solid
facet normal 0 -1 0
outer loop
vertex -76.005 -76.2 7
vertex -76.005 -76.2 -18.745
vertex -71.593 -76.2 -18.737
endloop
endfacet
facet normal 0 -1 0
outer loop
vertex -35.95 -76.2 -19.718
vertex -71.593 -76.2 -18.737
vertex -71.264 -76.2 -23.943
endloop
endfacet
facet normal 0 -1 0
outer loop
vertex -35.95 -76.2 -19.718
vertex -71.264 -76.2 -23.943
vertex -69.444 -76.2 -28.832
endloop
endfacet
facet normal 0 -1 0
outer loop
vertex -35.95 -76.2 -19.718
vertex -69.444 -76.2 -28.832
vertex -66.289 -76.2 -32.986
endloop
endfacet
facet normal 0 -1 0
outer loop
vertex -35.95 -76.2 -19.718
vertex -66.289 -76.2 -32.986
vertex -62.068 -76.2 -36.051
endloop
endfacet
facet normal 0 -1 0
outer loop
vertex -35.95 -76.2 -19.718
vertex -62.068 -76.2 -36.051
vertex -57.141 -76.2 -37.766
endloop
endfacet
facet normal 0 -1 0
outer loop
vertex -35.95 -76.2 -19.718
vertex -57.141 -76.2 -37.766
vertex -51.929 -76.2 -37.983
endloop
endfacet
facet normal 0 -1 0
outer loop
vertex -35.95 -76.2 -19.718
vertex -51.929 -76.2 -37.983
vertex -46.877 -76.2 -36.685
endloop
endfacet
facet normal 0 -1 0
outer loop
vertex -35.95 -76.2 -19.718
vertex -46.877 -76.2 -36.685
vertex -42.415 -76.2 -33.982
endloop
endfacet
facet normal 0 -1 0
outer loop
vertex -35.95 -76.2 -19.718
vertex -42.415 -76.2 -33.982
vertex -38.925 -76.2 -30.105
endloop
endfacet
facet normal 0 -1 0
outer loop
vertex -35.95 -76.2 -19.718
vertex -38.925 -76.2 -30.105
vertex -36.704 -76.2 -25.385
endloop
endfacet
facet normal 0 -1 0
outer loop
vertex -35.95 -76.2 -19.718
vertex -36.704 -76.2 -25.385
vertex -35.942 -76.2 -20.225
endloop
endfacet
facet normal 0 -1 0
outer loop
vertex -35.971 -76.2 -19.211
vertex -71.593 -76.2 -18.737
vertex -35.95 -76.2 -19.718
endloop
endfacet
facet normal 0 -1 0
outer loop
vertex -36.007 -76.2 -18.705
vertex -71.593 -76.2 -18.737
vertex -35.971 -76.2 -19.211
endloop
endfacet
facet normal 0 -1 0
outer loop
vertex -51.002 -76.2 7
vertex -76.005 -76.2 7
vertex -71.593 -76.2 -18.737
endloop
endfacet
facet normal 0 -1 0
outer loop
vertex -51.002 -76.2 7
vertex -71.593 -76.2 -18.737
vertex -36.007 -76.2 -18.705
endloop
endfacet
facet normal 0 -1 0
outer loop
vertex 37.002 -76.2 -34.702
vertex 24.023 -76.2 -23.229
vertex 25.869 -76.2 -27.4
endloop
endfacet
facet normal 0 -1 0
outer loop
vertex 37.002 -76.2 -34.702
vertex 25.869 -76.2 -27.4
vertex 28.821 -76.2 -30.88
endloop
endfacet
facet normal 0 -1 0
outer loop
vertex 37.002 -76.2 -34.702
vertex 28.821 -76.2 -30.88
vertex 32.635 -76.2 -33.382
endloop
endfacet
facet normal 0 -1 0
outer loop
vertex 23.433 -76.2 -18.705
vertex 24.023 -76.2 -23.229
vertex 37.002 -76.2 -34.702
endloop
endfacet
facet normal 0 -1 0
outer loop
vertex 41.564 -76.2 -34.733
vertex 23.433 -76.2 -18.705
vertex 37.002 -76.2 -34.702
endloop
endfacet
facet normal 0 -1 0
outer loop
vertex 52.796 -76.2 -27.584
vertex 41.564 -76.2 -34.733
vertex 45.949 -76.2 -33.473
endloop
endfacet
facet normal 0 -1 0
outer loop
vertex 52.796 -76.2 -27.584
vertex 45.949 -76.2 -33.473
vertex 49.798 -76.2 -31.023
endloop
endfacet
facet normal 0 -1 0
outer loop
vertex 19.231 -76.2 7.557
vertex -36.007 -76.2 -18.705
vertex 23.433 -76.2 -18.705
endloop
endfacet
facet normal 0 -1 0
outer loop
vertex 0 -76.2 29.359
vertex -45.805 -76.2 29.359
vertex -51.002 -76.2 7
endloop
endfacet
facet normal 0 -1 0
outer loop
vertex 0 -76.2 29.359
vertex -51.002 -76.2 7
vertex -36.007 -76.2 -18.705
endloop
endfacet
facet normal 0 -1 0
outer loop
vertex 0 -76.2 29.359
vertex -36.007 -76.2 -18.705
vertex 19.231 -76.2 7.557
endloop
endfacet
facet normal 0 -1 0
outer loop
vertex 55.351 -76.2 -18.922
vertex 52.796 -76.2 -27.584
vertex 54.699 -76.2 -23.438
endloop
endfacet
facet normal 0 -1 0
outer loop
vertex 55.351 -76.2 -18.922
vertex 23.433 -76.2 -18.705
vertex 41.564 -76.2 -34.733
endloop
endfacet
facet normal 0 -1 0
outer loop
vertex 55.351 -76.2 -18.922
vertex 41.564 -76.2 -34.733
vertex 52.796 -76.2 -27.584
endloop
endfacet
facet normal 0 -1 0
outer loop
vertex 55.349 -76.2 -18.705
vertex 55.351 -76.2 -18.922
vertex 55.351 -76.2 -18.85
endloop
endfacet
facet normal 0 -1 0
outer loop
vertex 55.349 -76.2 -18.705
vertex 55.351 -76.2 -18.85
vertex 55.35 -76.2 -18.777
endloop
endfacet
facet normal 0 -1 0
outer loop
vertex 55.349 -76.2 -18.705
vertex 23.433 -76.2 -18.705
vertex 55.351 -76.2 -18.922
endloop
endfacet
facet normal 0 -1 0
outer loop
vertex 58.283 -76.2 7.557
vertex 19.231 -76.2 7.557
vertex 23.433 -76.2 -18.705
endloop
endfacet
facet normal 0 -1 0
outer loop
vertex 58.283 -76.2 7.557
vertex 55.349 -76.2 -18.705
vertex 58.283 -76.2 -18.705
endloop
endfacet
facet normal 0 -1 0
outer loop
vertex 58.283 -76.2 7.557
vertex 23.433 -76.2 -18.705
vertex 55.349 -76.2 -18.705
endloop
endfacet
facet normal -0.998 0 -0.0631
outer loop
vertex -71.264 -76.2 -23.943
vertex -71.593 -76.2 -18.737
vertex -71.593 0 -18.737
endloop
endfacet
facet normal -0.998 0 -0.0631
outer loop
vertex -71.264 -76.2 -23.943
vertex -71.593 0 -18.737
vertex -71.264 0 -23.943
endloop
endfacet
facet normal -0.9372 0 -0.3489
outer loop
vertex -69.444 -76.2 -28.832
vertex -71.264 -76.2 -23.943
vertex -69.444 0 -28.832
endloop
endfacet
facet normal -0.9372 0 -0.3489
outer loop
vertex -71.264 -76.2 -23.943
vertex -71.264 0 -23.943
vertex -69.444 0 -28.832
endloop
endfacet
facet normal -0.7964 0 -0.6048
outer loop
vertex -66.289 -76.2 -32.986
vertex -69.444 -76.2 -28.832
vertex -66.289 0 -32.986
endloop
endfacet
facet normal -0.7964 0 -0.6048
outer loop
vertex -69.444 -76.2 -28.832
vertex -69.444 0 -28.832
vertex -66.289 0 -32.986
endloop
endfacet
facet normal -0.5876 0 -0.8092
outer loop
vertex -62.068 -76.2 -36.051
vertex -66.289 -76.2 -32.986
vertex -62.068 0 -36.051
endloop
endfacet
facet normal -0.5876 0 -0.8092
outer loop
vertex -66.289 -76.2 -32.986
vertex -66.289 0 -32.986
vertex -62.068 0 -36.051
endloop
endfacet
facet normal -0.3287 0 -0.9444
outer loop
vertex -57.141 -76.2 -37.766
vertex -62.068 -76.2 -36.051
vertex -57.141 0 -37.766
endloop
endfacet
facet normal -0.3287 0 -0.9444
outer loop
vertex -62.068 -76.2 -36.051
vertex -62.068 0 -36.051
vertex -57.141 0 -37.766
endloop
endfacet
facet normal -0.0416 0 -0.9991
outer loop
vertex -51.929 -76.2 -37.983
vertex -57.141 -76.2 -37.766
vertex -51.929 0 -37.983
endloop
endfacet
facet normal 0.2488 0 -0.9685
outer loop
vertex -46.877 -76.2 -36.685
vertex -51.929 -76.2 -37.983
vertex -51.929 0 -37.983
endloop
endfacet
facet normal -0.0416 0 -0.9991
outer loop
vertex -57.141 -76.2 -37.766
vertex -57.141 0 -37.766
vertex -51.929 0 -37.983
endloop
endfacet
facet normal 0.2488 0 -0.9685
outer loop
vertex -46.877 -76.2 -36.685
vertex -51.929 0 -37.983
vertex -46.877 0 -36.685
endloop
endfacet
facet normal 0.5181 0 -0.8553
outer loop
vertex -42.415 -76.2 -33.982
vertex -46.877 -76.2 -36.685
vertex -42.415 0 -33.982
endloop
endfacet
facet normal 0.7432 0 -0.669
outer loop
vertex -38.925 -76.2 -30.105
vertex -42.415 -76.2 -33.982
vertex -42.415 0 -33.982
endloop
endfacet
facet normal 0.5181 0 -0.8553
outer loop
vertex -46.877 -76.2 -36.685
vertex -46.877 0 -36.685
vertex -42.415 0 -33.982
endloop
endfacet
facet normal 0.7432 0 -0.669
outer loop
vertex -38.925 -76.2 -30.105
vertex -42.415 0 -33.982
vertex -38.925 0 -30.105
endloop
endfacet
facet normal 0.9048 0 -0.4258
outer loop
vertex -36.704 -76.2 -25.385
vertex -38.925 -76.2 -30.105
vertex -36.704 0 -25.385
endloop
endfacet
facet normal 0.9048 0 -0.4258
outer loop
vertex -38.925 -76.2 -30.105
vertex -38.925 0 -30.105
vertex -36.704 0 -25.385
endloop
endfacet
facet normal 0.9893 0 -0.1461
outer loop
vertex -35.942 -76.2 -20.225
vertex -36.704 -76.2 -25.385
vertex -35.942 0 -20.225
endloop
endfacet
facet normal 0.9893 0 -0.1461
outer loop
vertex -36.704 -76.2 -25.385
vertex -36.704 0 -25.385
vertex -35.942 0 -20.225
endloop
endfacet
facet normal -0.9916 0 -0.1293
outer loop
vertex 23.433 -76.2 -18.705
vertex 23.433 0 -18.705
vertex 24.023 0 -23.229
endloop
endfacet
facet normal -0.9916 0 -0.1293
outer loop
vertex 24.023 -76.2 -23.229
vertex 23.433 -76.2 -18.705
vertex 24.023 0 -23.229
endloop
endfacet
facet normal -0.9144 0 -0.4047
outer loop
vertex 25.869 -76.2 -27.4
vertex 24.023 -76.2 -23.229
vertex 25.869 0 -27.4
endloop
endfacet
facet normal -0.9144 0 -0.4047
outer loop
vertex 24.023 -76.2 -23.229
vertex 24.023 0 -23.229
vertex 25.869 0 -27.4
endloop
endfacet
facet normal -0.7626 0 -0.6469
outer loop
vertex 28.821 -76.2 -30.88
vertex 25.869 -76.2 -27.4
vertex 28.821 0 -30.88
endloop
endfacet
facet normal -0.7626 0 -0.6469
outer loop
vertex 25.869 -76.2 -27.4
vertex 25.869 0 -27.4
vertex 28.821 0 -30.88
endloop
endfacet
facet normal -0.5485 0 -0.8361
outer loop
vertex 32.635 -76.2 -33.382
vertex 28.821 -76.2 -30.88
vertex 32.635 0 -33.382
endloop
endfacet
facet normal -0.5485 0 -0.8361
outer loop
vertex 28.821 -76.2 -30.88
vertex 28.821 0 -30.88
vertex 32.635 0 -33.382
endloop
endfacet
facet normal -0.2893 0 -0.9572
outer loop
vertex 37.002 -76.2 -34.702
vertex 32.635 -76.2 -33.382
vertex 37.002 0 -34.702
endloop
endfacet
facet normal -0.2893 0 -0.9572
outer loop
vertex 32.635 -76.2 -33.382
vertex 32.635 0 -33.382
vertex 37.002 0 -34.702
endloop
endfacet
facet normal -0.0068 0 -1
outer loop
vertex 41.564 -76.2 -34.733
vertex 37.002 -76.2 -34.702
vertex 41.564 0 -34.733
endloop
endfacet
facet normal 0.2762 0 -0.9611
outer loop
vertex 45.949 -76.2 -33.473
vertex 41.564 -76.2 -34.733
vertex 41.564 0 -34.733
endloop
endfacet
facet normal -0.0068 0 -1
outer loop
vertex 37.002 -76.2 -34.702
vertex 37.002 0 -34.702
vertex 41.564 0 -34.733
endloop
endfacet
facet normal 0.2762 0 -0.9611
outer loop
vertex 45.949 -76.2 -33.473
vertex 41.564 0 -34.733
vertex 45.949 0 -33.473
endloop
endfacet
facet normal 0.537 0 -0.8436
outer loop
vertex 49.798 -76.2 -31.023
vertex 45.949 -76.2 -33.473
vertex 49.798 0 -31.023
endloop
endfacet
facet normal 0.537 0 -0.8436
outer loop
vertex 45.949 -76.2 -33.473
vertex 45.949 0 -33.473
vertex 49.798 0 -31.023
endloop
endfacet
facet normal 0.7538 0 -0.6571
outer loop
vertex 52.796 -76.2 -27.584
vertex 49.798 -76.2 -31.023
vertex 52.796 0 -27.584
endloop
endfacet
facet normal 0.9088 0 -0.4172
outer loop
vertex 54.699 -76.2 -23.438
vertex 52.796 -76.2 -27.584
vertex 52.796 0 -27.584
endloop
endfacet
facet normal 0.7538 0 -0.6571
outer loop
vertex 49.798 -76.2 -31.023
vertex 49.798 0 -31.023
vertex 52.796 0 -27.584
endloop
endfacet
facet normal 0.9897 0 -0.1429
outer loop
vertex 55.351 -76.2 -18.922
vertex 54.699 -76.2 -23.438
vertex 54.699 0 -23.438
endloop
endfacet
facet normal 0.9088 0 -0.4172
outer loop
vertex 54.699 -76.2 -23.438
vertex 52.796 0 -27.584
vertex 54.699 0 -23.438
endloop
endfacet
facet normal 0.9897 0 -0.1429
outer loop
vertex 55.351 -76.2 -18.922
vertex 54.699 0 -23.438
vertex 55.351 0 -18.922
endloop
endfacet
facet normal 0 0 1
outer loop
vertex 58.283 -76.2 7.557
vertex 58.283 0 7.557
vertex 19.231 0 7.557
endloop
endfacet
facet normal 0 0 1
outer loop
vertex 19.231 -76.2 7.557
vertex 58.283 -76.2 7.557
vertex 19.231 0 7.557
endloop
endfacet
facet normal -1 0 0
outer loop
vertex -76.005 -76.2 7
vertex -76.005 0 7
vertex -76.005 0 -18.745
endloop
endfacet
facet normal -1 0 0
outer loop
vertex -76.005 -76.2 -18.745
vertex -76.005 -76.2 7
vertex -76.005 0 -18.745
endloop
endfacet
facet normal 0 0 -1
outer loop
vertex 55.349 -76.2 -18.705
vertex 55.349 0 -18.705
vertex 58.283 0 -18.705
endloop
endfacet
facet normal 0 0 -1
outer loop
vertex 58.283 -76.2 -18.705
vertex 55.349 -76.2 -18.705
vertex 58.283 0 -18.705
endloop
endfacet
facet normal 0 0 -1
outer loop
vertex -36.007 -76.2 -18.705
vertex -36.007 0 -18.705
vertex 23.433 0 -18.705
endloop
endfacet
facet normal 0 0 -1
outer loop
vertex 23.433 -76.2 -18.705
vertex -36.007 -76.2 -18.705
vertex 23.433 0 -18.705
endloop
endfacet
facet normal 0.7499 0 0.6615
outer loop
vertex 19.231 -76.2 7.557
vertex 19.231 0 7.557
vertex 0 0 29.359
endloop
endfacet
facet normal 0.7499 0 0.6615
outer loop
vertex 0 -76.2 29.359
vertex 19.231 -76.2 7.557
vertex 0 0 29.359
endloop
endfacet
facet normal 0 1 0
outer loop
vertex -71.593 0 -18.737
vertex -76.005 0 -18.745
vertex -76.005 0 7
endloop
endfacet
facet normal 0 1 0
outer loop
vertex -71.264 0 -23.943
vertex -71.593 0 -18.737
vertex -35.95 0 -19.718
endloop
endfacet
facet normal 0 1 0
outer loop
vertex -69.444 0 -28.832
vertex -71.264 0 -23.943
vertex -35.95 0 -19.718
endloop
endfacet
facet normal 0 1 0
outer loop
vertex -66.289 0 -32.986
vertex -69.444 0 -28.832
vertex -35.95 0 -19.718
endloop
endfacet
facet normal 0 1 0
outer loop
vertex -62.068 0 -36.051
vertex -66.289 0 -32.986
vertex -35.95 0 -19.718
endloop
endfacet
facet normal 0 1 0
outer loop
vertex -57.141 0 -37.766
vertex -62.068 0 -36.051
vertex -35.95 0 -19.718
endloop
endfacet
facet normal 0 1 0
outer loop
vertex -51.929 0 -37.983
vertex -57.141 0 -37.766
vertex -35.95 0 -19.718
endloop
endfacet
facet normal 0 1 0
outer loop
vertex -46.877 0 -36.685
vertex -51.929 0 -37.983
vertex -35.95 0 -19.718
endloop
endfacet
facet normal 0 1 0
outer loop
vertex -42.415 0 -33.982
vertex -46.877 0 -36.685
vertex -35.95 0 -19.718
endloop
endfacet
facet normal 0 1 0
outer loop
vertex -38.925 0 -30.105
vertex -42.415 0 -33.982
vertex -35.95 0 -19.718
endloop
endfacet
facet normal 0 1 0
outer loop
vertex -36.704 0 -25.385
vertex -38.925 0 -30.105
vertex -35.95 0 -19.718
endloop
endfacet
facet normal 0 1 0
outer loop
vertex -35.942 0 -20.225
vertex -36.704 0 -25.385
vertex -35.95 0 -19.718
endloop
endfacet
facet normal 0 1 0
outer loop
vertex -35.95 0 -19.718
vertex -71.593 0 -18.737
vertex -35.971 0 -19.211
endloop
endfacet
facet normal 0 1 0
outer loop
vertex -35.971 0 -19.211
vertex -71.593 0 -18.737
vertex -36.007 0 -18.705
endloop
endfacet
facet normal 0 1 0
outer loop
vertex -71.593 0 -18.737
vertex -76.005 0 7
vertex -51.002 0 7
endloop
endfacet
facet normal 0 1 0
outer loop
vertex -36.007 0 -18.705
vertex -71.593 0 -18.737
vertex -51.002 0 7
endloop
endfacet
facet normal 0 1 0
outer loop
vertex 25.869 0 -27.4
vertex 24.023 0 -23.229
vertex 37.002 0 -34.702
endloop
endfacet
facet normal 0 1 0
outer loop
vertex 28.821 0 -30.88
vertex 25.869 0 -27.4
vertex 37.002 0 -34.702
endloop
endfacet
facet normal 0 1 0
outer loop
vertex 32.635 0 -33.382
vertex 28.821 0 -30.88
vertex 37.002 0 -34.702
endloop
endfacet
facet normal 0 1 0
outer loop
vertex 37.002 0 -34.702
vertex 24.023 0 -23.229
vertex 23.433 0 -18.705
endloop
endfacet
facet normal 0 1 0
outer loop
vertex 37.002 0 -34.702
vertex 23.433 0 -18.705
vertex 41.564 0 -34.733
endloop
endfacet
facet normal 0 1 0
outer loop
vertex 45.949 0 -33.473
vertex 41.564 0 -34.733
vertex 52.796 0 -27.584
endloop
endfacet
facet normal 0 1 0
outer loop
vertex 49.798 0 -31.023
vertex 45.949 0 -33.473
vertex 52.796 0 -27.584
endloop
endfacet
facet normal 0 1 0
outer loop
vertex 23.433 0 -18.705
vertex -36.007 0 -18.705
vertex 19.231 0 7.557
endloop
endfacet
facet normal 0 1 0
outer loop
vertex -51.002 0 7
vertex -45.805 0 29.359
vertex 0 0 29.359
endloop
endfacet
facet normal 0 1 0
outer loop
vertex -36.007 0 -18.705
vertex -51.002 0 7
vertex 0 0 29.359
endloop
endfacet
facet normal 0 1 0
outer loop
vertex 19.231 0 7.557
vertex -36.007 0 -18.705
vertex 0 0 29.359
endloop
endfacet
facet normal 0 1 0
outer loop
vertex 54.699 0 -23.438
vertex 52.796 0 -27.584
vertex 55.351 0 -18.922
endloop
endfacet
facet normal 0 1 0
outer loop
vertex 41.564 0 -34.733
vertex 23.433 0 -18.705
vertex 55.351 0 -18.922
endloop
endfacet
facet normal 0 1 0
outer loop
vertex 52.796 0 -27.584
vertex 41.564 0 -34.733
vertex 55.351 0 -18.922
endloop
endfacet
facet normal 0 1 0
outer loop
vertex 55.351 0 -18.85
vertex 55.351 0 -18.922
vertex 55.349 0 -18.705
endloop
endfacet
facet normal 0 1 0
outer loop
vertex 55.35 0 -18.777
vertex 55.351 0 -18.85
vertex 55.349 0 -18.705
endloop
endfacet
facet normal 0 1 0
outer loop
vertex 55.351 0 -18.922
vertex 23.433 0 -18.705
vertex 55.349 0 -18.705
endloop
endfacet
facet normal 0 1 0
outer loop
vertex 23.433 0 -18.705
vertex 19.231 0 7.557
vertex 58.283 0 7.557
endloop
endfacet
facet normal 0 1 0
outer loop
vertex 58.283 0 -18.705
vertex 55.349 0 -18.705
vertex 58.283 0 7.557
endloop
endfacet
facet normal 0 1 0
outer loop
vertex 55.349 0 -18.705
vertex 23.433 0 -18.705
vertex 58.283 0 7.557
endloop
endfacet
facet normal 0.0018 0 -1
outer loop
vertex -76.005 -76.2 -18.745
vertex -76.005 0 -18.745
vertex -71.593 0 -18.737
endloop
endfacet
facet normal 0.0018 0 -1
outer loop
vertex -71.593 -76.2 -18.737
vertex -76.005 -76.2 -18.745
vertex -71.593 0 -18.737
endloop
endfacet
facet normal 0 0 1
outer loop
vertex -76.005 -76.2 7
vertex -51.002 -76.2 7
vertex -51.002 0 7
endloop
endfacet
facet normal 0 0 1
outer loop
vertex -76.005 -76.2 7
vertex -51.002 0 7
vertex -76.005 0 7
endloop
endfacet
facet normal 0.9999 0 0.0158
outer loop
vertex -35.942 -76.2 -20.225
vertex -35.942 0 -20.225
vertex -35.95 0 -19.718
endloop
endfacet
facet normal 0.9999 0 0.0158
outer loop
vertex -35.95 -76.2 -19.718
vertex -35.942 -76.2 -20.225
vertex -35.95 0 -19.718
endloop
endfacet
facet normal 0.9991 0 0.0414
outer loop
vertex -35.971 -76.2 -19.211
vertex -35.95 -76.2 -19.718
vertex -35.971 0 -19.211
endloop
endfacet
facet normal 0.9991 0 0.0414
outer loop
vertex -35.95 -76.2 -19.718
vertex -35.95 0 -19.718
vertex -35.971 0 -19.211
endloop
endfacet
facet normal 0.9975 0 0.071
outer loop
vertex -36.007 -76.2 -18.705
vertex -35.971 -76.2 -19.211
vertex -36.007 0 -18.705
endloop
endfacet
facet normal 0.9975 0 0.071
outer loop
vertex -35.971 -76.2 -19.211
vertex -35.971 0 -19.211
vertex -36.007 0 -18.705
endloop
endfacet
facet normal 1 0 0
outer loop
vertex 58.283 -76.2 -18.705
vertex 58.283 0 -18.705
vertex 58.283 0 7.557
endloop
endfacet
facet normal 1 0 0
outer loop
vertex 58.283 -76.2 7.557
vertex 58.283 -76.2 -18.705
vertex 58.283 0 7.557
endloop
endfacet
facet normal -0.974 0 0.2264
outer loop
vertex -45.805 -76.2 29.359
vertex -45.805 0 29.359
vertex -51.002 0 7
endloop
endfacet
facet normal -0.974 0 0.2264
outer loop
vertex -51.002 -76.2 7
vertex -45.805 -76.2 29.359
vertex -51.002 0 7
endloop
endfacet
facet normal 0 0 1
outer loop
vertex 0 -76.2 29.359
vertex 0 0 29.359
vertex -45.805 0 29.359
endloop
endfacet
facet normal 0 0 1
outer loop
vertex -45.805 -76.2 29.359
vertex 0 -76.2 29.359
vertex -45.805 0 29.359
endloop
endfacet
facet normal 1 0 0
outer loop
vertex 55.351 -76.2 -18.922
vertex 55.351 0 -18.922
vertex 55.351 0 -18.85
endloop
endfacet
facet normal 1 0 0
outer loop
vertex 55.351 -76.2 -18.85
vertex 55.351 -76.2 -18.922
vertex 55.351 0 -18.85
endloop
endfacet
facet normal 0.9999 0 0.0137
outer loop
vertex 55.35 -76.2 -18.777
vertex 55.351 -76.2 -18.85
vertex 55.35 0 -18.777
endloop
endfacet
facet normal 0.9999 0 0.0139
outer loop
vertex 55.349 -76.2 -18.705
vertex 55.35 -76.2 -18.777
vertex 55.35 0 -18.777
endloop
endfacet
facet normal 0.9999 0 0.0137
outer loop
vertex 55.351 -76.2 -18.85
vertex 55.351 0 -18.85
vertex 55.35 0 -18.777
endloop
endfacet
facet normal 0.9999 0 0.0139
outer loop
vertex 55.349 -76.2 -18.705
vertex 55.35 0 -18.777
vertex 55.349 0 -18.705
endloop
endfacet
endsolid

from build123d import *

# Parameters (mm, degrees)
F3_DEPTH = 76.2


with BuildPart() as f3:
    # F2 (on face) → F3 (new body)
    with BuildSketch(Plane.XZ):
        with BuildLine():
            ThreePointArc((23.432876, -18.704671), (39.391141, -2.962637), (55.349406, -18.704671))
            Line((55.349406, -18.704671), (58.282666, -18.704671))
            Line((58.282666, -18.704671), (58.282666, 7.556662))
            Line((58.282666, 7.556662), (19.231044, 7.556662))
            Line((19.231044, 7.556662), (0, 29.359408))
            Line((0, 29.359408), (-45.805167, 29.359408))
            Line((-45.805167, 29.359408), (-51.002167, 7.000253))
            Line((-51.002167, 7.000253), (-76.00525, 7.000253))
            Line((-76.00525, 7.000253), (-76.00525, -18.745113))
            Line((-76.00525, -18.745113), (-71.593166, -18.737061))
            ThreePointArc((-71.593166, -18.737061), (-53.815115, -2.368458), (-36.007295, -18.704671))
            Line((-36.007295, -18.704671), (23.432876, -18.704671))
        make_face()
        with BuildLine():
            Line((-53.844772, -18.704671), (-36.007295, -18.704671))
            ThreePointArc((-36.007295, -18.704671), (-53.815115, -2.368458), (-71.593166, -18.737061))
            Line((-71.593166, -18.737061), (-53.844772, -18.704671))
        make_face()
        with BuildLine():
            ThreePointArc((-35.942469, -20.224843), (-35.958683, -19.464066), (-36.007295, -18.704671))
            Line((-36.007295, -18.704671), (-53.844772, -18.704671))
            Line((-53.844772, -18.704671), (-71.593166, -18.737061))
            ThreePointArc((-71.593166, -18.737061), (-54.5434, -38.065707), (-35.942469, -20.224843))
        make_face()
        with BuildLine():
            ThreePointArc((23.432876, -18.704671), (39.282281, -34.881765), (55.350891, -18.922387))
            ThreePointArc((55.350891, -18.922387), (55.35052, -18.813527), (55.349406, -18.704671))
            Line((55.349406, -18.704671), (23.432876, -18.704671))
        make_face()
        with BuildLine():
            Line((23.432876, -18.704671), (55.349406, -18.704671))
            ThreePointArc((55.349406, -18.704671), (39.391141, -2.962637), (23.432876, -18.704671))
        make_face()
    extrude(amount=F3_DEPTH)


solid = f3.part
